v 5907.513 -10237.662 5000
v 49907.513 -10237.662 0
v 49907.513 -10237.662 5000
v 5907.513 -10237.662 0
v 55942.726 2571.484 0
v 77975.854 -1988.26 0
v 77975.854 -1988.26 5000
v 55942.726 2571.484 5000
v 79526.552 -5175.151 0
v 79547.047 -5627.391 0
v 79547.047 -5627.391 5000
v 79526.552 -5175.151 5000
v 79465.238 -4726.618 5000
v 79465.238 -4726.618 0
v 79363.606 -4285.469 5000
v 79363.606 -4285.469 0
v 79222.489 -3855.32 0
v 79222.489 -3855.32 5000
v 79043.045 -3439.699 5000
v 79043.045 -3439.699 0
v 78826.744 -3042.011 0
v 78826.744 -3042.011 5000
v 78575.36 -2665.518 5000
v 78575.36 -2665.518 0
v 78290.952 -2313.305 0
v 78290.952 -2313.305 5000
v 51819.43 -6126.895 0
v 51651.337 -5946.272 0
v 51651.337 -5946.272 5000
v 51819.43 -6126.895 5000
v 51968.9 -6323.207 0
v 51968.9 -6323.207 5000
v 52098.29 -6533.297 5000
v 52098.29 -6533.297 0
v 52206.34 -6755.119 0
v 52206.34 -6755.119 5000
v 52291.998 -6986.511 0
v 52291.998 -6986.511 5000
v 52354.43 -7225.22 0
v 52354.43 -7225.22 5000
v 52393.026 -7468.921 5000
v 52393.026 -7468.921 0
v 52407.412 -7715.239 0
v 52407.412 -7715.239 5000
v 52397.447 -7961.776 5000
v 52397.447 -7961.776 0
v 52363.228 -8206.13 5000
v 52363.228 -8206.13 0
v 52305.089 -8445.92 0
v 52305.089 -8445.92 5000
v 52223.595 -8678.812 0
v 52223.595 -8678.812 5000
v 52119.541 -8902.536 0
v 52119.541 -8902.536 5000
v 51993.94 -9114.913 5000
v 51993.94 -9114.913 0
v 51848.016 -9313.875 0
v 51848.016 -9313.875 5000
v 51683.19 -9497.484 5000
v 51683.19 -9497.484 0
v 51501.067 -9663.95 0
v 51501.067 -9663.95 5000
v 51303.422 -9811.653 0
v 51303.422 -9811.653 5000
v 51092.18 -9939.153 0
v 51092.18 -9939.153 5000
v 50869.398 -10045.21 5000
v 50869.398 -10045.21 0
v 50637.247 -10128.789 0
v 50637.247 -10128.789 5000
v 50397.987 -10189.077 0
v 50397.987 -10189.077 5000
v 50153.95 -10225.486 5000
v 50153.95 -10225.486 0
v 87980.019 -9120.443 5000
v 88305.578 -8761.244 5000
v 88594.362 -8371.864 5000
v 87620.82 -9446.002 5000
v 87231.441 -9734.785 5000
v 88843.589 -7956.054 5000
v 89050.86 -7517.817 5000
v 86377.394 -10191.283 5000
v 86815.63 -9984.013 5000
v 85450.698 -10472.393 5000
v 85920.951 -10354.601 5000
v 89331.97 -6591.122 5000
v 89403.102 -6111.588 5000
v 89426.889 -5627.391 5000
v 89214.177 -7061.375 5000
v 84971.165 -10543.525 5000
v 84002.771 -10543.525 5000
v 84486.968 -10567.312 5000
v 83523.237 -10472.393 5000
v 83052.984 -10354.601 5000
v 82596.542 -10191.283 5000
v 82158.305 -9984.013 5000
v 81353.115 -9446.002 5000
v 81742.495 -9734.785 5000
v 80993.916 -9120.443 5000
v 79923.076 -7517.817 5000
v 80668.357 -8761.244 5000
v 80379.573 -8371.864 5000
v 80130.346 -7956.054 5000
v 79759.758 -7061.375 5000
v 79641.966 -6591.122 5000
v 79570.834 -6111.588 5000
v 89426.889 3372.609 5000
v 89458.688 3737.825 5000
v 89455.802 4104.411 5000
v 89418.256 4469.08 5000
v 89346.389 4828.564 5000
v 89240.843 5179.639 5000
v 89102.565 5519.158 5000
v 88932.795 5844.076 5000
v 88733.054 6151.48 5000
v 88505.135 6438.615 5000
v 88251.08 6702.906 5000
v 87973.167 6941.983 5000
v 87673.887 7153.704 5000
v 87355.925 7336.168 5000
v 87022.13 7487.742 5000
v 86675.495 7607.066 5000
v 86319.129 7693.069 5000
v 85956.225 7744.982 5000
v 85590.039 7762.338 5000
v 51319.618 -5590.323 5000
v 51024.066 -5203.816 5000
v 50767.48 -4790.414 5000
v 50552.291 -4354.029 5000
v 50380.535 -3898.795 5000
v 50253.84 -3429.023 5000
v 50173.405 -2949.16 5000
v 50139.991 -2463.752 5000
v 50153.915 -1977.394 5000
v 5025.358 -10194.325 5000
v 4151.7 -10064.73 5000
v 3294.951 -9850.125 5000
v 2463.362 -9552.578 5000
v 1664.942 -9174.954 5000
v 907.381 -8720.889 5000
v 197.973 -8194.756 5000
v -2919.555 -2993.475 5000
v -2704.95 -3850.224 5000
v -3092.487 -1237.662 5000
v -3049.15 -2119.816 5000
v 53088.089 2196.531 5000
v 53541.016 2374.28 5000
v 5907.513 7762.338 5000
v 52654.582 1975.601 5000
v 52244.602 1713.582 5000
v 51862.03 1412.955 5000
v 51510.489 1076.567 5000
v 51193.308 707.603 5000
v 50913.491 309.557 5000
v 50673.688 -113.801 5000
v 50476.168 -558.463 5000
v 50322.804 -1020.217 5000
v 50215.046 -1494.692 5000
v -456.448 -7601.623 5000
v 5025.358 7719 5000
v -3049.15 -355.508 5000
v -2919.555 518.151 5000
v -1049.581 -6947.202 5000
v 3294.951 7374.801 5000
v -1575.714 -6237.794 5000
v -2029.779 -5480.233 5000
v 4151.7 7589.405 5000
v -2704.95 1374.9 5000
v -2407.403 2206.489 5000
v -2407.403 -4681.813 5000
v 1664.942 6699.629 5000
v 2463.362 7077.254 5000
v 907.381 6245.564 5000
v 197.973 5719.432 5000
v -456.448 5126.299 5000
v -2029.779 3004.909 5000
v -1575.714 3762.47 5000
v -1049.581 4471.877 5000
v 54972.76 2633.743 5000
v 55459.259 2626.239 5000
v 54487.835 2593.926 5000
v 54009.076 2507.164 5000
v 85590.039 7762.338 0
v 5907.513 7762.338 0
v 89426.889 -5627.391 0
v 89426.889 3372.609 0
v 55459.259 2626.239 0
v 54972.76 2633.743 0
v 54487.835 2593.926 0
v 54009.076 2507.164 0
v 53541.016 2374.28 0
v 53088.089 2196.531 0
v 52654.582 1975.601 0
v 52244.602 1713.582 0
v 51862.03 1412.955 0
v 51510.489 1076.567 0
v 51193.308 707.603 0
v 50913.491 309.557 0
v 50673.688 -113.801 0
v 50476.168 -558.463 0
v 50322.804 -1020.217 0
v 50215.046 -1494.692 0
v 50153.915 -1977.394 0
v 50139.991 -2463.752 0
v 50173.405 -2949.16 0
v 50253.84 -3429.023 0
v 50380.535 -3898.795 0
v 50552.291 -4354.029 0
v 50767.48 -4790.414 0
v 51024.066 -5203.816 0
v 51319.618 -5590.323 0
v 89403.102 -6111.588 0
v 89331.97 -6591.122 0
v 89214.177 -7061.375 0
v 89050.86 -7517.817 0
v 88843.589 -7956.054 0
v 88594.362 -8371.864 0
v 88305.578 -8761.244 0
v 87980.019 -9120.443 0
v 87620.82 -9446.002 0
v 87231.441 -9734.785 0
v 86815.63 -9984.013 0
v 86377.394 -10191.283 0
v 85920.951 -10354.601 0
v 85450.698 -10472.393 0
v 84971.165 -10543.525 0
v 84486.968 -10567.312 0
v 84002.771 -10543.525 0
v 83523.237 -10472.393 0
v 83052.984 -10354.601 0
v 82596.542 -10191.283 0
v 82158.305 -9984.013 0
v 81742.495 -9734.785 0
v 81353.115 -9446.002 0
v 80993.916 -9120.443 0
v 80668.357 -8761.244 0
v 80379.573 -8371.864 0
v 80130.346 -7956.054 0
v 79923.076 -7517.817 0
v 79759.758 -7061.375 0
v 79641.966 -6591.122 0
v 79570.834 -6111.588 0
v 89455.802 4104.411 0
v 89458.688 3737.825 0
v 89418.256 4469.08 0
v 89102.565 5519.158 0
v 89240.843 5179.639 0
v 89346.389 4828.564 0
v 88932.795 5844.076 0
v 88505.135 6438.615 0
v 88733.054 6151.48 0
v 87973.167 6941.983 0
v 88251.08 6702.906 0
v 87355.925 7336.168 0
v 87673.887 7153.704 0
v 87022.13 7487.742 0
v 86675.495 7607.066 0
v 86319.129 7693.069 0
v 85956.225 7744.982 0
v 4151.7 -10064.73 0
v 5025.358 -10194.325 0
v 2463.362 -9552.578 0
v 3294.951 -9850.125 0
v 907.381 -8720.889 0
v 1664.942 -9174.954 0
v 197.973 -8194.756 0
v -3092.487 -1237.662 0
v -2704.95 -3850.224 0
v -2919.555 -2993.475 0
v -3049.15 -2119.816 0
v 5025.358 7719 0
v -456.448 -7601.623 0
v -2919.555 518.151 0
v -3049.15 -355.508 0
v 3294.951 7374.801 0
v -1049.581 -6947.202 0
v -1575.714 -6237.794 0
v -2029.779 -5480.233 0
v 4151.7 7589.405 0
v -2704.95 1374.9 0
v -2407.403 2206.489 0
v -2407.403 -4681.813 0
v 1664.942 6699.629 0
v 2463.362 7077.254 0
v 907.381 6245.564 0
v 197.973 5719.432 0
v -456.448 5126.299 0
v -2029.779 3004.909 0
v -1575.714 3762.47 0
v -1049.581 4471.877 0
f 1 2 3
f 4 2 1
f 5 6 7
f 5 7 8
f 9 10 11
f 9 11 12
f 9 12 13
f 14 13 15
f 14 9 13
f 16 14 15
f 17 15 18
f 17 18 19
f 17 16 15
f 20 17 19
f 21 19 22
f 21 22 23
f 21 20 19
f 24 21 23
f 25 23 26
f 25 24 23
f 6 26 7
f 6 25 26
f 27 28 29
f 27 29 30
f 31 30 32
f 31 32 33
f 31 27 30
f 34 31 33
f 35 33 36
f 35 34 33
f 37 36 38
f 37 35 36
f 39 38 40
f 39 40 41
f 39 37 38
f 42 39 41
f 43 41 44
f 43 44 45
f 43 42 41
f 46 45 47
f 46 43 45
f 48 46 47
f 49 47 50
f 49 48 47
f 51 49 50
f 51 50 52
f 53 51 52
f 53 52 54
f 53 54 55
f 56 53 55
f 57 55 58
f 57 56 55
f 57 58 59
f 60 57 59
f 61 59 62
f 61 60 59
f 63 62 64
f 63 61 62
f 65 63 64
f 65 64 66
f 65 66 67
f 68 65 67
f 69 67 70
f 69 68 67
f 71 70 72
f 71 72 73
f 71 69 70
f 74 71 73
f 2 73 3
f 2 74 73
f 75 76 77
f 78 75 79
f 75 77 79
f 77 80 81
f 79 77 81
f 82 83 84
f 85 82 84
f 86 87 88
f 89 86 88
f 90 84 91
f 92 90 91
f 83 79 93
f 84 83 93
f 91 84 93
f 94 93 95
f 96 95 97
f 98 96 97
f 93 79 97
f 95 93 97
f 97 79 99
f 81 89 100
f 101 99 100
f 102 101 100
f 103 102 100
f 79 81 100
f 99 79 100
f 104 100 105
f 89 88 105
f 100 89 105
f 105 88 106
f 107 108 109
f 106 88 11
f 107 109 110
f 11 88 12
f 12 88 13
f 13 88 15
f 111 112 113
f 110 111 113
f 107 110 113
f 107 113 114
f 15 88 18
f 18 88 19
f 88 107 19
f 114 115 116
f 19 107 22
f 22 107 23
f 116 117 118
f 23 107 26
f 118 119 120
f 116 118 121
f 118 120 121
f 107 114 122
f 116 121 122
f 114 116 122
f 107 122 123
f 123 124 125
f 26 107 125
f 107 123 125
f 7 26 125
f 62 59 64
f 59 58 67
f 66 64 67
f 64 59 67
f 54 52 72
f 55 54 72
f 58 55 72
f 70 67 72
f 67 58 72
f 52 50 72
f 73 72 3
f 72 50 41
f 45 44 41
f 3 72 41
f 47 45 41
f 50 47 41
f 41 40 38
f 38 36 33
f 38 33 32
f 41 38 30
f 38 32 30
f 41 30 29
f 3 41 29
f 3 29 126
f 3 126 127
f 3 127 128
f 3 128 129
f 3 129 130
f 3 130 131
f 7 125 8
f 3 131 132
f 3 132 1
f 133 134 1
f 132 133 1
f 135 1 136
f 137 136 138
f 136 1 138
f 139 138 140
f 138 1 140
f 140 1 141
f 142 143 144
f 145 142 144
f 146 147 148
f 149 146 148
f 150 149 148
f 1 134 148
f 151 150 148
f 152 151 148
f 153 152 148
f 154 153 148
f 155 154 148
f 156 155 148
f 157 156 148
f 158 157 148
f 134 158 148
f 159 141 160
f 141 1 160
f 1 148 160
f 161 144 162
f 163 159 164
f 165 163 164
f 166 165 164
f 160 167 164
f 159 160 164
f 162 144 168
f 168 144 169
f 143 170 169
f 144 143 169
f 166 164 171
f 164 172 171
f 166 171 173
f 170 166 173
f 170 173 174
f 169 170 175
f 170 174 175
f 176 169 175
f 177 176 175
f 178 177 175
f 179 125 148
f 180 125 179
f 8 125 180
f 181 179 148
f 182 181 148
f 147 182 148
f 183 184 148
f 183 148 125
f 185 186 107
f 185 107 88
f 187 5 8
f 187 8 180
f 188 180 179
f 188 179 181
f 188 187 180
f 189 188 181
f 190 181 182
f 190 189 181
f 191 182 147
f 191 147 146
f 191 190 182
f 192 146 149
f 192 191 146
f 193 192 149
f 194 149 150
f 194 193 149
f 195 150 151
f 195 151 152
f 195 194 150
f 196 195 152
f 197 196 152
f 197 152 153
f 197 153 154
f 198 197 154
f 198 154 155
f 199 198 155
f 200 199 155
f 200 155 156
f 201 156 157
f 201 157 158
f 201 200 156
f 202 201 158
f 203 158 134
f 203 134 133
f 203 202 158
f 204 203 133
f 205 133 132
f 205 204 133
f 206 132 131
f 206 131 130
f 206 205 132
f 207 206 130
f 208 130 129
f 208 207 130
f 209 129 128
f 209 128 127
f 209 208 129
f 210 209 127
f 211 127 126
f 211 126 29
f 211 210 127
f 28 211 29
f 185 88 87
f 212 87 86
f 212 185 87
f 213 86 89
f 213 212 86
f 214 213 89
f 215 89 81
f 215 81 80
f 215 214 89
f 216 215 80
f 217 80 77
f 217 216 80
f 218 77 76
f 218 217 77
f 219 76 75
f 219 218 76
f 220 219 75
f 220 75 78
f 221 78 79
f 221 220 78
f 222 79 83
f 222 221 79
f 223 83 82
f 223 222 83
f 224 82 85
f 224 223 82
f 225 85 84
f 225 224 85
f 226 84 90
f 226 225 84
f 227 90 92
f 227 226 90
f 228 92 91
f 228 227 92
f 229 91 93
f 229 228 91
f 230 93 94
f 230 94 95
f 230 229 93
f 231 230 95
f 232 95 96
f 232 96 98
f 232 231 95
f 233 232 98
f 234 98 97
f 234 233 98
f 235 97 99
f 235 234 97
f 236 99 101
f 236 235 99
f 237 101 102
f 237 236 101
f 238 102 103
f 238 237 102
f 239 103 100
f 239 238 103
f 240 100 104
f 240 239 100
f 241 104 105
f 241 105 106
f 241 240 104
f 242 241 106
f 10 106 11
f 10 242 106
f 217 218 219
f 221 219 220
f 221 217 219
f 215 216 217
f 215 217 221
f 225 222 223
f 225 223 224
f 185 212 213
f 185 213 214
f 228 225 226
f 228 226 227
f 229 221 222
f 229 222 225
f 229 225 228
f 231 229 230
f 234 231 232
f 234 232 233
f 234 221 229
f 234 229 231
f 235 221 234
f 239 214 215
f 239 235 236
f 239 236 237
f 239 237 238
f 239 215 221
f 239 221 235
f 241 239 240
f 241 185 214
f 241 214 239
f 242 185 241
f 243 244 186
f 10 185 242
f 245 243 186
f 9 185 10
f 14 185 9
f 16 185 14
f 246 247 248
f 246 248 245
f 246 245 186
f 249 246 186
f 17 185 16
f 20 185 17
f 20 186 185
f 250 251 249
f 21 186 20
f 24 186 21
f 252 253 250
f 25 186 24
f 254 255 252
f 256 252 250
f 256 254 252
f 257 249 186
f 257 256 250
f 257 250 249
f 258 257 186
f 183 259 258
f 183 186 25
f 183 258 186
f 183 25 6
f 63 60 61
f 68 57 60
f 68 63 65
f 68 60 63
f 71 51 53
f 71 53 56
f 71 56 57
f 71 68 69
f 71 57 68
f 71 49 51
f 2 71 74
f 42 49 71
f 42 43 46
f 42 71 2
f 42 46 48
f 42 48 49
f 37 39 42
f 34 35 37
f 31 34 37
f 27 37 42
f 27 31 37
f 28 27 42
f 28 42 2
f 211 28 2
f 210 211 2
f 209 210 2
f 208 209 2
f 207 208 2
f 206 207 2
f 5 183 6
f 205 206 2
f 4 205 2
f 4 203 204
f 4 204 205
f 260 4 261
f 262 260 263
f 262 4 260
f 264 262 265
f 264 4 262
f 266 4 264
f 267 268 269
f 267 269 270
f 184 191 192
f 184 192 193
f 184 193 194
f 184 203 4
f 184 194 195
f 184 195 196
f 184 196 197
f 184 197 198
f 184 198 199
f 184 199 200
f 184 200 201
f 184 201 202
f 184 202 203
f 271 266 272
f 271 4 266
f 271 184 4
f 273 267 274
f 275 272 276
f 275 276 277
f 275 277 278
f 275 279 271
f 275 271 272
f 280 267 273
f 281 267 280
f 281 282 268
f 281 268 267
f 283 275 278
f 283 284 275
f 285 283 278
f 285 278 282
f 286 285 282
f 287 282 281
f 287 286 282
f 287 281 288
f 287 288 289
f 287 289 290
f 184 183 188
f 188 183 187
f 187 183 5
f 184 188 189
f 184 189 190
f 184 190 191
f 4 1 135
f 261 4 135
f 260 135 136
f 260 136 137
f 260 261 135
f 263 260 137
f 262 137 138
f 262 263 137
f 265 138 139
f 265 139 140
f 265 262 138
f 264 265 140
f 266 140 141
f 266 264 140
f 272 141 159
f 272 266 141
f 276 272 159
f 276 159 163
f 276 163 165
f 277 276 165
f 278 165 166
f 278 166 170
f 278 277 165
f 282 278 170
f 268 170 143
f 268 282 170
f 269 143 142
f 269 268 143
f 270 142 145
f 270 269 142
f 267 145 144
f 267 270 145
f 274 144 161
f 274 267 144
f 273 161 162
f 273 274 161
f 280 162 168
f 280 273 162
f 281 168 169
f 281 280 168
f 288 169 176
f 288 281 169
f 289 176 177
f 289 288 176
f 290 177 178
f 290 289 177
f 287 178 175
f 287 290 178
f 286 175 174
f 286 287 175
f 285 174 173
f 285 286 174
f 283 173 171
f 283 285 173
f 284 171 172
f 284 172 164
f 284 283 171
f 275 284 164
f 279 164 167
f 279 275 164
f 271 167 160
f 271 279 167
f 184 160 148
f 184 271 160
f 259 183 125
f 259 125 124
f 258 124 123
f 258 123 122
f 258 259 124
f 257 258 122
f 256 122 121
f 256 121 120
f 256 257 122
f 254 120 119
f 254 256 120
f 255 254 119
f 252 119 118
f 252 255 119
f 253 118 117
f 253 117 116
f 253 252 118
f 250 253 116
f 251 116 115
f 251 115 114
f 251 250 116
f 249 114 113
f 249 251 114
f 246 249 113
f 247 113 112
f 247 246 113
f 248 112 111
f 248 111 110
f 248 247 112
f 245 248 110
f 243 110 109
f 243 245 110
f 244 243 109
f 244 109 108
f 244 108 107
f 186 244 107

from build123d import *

# Parameters (mm, degrees)
BOSS_EXTRUDE2_DEPTH = 5000
BOSS_EXTRUDE6_DEPTH = 1212


with BuildPart() as part:
    # Sketch1 → Boss-Extrude2 (new body)
    with BuildSketch(Plane.XY):
        with BuildLine():
            Line((5907.51269427, 7762.337878808), (85590.03917175, 7762.337878808))
            ThreePointArc((85590.03917175, 7762.337878808), (88505.13507032, 6438.615293192), (89426.888836533, 3372.608839186))
            Line((89426.888836533, 3372.608839186), (89426.888836533, -5627.391160814))
            ThreePointArc((89426.888836533, -5627.391160814), (84486.967683967, -10567.31231338), (79547.046531401, -5627.391160814))
            ThreePointArc((79547.046531401, -5627.391160814), (79137.473389404, -3645.477625535), (77975.854026873, -1988.259511781))
            Line((77975.854026873, -1988.259511781), (55942.725833298, 2571.484121965))
            ThreePointArc((55942.725833298, 2571.484121965), (50673.68769565, -113.801167554), (51651.337002069, -5946.272497595))
            ThreePointArc((51651.337002069, -5946.272497595), (52223.594953063, -8678.811934189), (49907.51269427, -10237.662121192))
            Line((49907.51269427, -10237.662121192), (5907.51269427, -10237.662121192))
            ThreePointArc((5907.51269427, -10237.662121192), (-3092.48730573, -1237.662121192), (5907.51269427, 7762.337878808))
        make_face()
    extrude(amount=BOSS_EXTRUDE2_DEPTH)

    # Sketch3 → Boss-Extrude6 (add)
    with BuildSketch(Plane.XY.offset(5000)):
        with BuildLine():
            Line((85590.03917175, 6562.337878808), (5907.51269427, 6562.337878808))
            ThreePointArc((5907.51269427, 6562.337878808), (-1892.48730573, -1237.662121192), (5907.51269427, -9037.662121192))
            Line((5907.51269427, -9037.662121192), (49907.51269427, -9037.662121192))
            ThreePointArc((49907.51269427, -9037.662121192), (51111.875468842, -8227.06002395), (50814.301334326, -6806.139516922))
            ThreePointArc((50814.301334326, -6806.139516922), (49608.09207013, 438.152081508), (56162.21300372, 3751.488819598))
            Line((56162.21300372, 3751.488819598), (78532.454339426, -878.020191545))
            ThreePointArc((78532.454339426, -878.020191545), (80166.18918886, -3007.231662783), (80747.046531401, -5627.391160814))
            ThreePointArc((80747.046531401, -5627.391160814), (84486.967683967, -9367.31231338), (88226.888836533, -5627.391160814))
            Line((88226.888836533, -5627.391160814), (88226.888836533, 3460.755560892))
            ThreePointArc((88226.888836533, 3460.755560892), (87625.523698188, 5621.164140917), (85590.03917175, 6562.337878808))
        make_face()
    extrude(amount=-BOSS_EXTRUDE6_DEPTH)


solid = part.part
